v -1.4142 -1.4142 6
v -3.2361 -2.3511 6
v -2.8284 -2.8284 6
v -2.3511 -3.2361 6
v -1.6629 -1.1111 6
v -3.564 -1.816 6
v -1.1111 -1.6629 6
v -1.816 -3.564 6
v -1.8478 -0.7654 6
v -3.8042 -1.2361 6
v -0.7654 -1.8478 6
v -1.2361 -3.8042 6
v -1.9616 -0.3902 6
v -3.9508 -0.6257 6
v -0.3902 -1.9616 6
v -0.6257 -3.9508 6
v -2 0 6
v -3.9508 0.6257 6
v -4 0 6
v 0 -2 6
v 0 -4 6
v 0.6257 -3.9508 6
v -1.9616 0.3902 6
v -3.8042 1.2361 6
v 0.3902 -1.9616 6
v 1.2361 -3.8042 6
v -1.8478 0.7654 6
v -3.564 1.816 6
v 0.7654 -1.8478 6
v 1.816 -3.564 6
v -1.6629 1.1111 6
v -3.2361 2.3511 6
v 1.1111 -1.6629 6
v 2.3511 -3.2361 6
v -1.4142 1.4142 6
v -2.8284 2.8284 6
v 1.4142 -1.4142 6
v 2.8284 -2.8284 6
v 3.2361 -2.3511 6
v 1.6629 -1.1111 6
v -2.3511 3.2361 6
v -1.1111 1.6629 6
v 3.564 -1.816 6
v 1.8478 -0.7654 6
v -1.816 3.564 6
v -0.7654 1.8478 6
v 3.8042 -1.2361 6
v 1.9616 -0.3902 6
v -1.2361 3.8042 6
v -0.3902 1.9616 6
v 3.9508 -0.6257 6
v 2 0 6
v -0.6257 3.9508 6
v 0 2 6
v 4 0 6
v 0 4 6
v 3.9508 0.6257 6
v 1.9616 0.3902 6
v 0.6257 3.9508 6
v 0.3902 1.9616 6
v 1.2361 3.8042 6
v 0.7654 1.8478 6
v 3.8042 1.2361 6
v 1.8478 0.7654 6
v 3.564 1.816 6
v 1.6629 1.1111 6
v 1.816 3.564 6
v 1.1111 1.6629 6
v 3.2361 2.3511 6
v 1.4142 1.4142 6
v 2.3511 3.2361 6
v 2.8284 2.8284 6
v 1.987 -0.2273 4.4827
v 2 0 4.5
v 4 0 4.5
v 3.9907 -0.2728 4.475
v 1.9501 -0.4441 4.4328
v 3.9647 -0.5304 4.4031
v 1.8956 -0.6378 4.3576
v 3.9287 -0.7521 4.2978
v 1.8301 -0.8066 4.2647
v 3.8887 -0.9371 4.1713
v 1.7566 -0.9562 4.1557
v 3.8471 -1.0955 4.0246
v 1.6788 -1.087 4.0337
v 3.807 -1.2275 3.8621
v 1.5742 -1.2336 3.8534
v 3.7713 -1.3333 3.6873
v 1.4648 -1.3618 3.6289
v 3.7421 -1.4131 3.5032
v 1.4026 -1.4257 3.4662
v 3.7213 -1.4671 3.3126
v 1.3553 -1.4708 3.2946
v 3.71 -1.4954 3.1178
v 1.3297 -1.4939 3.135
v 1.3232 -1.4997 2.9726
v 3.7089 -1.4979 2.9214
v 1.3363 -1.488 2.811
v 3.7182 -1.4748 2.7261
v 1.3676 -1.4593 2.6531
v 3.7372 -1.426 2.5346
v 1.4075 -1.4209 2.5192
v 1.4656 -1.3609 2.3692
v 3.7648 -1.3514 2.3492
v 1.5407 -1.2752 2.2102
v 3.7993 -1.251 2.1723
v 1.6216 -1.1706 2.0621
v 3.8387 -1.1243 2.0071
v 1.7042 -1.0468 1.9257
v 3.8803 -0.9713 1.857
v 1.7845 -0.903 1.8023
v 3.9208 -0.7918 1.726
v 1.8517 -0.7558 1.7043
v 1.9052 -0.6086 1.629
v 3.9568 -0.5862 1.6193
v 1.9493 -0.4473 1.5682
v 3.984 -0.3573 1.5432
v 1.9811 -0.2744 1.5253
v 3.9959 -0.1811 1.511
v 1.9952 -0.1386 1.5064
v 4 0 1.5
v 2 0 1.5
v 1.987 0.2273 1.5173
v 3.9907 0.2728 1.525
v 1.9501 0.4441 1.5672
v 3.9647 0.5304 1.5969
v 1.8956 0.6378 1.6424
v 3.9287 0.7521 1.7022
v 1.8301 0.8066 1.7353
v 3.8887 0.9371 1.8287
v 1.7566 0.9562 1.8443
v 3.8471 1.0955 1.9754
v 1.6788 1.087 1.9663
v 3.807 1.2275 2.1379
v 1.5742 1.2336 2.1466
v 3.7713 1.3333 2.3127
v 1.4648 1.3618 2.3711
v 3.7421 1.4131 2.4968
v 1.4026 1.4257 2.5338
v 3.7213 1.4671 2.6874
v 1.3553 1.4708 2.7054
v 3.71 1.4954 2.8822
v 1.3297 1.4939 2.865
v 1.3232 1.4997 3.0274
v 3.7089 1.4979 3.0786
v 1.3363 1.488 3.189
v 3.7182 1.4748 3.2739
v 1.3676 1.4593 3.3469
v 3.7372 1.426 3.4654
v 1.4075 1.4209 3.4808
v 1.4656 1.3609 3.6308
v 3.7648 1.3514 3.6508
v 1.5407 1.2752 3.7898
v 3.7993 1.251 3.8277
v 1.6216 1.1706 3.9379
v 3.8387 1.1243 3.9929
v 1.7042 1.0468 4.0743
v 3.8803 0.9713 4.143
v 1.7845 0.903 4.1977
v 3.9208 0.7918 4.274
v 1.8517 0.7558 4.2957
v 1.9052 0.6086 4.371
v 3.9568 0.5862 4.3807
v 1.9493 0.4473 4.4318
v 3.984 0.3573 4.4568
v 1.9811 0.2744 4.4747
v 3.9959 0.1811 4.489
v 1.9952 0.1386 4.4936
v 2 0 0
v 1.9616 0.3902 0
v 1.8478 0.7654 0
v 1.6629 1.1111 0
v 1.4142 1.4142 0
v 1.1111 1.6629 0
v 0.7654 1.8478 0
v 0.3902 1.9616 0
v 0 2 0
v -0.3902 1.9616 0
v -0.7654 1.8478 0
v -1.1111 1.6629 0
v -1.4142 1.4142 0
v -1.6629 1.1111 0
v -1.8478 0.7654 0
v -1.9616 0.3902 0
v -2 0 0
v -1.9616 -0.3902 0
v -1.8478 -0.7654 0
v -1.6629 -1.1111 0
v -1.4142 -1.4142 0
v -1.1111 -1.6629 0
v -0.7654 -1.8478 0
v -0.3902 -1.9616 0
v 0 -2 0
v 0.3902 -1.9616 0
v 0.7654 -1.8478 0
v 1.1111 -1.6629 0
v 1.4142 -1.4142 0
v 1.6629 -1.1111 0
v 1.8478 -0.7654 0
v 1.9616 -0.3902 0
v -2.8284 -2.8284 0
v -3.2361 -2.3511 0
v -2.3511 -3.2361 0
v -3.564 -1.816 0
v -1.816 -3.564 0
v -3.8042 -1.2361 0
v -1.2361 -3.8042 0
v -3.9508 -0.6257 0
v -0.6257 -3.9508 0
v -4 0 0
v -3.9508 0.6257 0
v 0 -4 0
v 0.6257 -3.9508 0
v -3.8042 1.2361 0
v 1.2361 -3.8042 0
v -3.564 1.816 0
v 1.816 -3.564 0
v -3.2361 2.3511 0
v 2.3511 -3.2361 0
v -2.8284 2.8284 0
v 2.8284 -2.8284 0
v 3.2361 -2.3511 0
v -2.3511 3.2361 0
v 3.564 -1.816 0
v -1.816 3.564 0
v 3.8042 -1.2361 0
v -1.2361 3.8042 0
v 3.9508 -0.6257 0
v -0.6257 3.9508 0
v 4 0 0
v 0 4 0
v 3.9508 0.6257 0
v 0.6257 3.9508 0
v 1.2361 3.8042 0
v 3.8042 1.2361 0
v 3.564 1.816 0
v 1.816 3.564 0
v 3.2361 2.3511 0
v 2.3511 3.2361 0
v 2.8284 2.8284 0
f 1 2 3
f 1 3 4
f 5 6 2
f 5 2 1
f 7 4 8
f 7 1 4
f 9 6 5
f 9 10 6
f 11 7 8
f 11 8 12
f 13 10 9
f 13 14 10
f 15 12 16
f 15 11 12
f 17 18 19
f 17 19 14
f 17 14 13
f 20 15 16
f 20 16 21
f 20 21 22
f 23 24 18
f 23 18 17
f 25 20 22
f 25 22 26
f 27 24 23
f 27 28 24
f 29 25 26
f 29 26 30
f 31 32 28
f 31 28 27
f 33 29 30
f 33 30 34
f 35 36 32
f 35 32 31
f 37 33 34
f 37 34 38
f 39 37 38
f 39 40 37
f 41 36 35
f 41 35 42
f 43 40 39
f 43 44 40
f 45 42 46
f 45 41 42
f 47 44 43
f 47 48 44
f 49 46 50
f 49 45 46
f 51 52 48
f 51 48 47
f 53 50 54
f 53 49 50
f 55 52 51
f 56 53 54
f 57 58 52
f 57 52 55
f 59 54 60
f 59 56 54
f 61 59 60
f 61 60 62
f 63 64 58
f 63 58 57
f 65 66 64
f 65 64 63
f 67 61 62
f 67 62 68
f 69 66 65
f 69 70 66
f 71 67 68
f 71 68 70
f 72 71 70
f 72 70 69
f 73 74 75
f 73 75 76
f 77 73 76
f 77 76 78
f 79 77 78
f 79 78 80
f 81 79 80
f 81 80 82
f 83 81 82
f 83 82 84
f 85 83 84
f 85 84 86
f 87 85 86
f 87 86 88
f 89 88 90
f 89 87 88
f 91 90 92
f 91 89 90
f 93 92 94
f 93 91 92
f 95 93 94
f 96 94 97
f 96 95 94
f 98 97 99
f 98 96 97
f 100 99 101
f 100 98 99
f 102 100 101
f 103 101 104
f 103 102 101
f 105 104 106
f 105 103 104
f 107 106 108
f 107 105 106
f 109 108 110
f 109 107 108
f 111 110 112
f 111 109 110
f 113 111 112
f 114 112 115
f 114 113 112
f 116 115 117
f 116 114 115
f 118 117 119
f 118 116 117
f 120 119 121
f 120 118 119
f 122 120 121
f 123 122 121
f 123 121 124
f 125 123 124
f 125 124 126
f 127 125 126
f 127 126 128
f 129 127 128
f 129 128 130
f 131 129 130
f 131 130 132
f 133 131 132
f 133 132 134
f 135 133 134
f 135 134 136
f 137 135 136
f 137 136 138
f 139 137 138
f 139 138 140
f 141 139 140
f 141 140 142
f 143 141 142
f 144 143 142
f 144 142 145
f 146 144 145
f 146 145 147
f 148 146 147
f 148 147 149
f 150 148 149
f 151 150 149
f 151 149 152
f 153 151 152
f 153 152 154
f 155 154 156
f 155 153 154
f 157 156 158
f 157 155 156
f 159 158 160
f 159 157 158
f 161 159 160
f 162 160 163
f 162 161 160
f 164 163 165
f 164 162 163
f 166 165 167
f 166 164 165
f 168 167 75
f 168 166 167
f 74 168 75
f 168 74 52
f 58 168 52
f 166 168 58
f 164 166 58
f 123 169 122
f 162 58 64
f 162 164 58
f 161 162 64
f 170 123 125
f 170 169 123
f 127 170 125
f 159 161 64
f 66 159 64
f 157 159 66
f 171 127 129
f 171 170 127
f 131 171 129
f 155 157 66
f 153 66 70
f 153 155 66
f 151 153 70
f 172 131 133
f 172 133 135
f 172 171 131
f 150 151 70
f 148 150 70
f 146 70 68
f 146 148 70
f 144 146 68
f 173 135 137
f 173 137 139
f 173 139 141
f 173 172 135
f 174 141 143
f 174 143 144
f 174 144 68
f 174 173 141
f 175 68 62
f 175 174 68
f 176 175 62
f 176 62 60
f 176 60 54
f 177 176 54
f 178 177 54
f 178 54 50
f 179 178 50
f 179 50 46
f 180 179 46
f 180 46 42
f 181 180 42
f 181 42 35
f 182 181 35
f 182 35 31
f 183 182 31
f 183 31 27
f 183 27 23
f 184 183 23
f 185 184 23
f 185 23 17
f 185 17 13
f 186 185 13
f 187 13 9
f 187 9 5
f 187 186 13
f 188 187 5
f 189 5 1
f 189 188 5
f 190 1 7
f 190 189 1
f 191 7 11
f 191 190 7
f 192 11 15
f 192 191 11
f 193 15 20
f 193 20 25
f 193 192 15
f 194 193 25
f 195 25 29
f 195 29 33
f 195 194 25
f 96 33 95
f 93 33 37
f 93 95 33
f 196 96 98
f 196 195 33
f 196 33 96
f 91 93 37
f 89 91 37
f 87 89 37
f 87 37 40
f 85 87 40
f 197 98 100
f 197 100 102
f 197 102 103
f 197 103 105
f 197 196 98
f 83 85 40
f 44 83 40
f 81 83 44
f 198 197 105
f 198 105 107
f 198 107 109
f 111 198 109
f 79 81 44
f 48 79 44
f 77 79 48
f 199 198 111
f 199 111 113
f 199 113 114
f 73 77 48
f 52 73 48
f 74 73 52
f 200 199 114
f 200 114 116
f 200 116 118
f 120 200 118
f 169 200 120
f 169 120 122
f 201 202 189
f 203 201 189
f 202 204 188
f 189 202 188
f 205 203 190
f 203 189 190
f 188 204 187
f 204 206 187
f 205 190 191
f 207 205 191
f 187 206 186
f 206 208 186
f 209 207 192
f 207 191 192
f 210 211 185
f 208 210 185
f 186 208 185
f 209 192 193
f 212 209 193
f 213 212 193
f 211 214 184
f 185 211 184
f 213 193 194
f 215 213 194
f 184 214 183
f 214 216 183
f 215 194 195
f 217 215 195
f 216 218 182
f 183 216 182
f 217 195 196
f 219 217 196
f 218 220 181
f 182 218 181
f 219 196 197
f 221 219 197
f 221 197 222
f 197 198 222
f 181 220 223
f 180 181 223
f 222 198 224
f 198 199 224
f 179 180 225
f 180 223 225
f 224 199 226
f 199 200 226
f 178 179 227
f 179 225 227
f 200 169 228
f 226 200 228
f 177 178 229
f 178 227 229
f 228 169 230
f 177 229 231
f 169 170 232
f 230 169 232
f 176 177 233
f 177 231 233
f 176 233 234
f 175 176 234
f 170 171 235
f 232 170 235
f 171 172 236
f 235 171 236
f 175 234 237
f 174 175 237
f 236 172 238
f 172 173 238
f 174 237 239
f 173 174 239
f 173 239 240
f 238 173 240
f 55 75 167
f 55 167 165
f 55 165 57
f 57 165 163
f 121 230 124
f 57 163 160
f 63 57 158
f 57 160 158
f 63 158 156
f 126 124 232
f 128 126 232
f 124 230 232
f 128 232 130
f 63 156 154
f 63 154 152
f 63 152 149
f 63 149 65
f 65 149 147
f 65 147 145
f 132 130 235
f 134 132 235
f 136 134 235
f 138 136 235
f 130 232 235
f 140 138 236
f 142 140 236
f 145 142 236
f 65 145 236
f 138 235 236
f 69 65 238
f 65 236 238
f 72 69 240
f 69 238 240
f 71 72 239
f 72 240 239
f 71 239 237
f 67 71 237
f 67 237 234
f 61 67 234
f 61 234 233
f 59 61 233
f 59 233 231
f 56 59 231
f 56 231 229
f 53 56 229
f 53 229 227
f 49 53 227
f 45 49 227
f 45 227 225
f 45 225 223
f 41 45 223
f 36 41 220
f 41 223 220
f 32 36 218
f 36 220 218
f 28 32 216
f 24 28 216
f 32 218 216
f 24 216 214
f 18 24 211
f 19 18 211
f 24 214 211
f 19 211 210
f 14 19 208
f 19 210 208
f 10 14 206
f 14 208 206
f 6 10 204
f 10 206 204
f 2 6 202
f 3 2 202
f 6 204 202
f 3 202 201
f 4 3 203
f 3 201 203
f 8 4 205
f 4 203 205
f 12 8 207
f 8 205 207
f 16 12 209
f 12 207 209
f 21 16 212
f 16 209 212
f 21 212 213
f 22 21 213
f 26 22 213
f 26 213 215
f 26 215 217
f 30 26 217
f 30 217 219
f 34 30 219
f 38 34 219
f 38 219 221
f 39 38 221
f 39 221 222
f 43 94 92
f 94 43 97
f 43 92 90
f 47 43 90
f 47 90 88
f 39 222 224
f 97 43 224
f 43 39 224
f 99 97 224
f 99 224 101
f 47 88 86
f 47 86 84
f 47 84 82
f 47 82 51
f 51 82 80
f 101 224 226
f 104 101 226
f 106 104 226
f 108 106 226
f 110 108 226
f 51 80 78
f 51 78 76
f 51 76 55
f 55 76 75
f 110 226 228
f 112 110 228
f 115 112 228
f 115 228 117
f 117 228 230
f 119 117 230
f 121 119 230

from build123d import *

# Parameters (mm, degrees)
SKETCH_1_R           = 4
SKETCH_1_R_2         = 2.025
EXTRUDE_6_DEPTH      = 6
MOVE_FACE_D4_BY      = 0.025
SKETCH_2_R           = 1.5
CUT_EXTRUDE_M3_DEPTH = 9.246211251


with BuildPart() as part:
    # 草图1 → 轴向尺寸_6 (new body)
    with BuildSketch(Plane.XY):
        Circle(SKETCH_1_R)
        Circle(SKETCH_1_R_2, mode=Mode.SUBTRACT)
    extrude(amount=EXTRUDE_6_DEPTH)

    # Move Face D4: a curved face moved outward by 0.025
    add(Solid.thicken(part.faces().sort_by_distance((-2.025, 0, 3))[0], MOVE_FACE_D4_BY))

    # 草图2 → 径向M3螺纹大径包络 (cut, through all)
    with BuildSketch(Plane(origin=(0, 0, 0), x_dir=(0, 0, -1), z_dir=(1, 0, 0))):
        with Locations(Location((-3, 0, 0), (0, 0, 180))):
            Circle(SKETCH_2_R)
    extrude(amount=CUT_EXTRUDE_M3_DEPTH, mode=Mode.SUBTRACT)


solid = part.part
